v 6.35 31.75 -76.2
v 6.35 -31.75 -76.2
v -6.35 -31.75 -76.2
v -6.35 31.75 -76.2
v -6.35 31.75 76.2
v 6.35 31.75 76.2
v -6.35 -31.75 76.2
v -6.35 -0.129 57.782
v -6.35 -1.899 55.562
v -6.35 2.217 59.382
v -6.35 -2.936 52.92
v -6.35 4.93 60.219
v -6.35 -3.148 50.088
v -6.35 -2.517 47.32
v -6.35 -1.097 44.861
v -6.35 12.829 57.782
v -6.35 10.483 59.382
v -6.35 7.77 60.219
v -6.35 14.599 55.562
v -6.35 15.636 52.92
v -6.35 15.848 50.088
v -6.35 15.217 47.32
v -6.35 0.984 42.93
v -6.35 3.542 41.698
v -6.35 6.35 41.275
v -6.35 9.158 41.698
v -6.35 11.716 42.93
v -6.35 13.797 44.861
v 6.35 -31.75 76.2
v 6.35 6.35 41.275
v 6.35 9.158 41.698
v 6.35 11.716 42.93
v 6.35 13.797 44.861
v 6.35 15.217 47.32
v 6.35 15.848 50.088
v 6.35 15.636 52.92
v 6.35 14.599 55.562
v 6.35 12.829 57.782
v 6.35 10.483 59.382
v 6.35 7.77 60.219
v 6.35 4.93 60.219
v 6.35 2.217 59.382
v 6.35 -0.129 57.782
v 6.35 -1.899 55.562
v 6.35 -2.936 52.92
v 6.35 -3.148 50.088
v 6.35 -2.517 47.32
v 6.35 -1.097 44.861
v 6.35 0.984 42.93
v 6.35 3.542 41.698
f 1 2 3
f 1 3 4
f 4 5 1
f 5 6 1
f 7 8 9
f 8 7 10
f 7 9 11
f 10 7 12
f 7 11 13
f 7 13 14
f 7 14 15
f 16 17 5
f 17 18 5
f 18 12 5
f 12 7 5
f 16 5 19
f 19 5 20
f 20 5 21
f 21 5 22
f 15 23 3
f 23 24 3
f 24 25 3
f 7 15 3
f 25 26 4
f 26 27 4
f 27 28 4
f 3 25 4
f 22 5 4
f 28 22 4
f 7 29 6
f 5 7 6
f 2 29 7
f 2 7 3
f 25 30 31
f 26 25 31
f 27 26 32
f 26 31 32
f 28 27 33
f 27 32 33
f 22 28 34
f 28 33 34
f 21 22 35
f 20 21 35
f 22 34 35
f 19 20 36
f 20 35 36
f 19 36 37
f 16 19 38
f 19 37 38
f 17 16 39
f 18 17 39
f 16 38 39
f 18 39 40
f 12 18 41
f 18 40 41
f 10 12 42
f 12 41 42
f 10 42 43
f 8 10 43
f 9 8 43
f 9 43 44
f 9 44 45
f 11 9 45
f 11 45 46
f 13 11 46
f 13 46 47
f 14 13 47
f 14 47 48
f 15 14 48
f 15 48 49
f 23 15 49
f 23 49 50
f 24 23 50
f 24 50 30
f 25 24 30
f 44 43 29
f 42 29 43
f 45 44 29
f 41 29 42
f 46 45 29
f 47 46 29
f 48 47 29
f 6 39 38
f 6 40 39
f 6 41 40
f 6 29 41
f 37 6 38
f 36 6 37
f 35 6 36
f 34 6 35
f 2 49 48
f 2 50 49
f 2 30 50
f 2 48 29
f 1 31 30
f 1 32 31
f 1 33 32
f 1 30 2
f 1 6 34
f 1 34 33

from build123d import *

# Parameters (mm, degrees)
SKETCH1_W           = 152.4
SKETCH1_H           = 63.5
BOSS_EXTRUDE1_DEPTH = 6.35
CUT_EXTRUDE1_REACH  = 14.7
SKETCH2_R           = 9.525


with BuildPart() as part:
    # Sketch1 → Boss-Extrude1 (new body, symmetric)
    with BuildSketch(Plane(origin=(0, 0, 0), x_dir=(0, 0, -1), z_dir=(1, 0, 0))):
        Rectangle(SKETCH1_W, SKETCH1_H)
    extrude(amount=BOSS_EXTRUDE1_DEPTH, both=True)

    # Sketch2 → Cut-Extrude1 (cut, up to next)
    with BuildSketch(Plane(origin=(6.35, 0, 0), x_dir=(0, 0, -1), z_dir=(1, 0, 0)), mode=Mode.PRIVATE) as cut_extrude1_sk1:
        with Locations((-50.8, 6.35)):
            Circle(SKETCH2_R)
    cut_extrude1_tool1 = extrude(cut_extrude1_sk1.sketch, amount=-CUT_EXTRUDE1_REACH, mode=Mode.PRIVATE) & part.part
    add(cut_extrude1_tool1.solids().sort_by_distance((6.35, 6.35, 50.8))[0], mode=Mode.SUBTRACT)


solid = part.part
